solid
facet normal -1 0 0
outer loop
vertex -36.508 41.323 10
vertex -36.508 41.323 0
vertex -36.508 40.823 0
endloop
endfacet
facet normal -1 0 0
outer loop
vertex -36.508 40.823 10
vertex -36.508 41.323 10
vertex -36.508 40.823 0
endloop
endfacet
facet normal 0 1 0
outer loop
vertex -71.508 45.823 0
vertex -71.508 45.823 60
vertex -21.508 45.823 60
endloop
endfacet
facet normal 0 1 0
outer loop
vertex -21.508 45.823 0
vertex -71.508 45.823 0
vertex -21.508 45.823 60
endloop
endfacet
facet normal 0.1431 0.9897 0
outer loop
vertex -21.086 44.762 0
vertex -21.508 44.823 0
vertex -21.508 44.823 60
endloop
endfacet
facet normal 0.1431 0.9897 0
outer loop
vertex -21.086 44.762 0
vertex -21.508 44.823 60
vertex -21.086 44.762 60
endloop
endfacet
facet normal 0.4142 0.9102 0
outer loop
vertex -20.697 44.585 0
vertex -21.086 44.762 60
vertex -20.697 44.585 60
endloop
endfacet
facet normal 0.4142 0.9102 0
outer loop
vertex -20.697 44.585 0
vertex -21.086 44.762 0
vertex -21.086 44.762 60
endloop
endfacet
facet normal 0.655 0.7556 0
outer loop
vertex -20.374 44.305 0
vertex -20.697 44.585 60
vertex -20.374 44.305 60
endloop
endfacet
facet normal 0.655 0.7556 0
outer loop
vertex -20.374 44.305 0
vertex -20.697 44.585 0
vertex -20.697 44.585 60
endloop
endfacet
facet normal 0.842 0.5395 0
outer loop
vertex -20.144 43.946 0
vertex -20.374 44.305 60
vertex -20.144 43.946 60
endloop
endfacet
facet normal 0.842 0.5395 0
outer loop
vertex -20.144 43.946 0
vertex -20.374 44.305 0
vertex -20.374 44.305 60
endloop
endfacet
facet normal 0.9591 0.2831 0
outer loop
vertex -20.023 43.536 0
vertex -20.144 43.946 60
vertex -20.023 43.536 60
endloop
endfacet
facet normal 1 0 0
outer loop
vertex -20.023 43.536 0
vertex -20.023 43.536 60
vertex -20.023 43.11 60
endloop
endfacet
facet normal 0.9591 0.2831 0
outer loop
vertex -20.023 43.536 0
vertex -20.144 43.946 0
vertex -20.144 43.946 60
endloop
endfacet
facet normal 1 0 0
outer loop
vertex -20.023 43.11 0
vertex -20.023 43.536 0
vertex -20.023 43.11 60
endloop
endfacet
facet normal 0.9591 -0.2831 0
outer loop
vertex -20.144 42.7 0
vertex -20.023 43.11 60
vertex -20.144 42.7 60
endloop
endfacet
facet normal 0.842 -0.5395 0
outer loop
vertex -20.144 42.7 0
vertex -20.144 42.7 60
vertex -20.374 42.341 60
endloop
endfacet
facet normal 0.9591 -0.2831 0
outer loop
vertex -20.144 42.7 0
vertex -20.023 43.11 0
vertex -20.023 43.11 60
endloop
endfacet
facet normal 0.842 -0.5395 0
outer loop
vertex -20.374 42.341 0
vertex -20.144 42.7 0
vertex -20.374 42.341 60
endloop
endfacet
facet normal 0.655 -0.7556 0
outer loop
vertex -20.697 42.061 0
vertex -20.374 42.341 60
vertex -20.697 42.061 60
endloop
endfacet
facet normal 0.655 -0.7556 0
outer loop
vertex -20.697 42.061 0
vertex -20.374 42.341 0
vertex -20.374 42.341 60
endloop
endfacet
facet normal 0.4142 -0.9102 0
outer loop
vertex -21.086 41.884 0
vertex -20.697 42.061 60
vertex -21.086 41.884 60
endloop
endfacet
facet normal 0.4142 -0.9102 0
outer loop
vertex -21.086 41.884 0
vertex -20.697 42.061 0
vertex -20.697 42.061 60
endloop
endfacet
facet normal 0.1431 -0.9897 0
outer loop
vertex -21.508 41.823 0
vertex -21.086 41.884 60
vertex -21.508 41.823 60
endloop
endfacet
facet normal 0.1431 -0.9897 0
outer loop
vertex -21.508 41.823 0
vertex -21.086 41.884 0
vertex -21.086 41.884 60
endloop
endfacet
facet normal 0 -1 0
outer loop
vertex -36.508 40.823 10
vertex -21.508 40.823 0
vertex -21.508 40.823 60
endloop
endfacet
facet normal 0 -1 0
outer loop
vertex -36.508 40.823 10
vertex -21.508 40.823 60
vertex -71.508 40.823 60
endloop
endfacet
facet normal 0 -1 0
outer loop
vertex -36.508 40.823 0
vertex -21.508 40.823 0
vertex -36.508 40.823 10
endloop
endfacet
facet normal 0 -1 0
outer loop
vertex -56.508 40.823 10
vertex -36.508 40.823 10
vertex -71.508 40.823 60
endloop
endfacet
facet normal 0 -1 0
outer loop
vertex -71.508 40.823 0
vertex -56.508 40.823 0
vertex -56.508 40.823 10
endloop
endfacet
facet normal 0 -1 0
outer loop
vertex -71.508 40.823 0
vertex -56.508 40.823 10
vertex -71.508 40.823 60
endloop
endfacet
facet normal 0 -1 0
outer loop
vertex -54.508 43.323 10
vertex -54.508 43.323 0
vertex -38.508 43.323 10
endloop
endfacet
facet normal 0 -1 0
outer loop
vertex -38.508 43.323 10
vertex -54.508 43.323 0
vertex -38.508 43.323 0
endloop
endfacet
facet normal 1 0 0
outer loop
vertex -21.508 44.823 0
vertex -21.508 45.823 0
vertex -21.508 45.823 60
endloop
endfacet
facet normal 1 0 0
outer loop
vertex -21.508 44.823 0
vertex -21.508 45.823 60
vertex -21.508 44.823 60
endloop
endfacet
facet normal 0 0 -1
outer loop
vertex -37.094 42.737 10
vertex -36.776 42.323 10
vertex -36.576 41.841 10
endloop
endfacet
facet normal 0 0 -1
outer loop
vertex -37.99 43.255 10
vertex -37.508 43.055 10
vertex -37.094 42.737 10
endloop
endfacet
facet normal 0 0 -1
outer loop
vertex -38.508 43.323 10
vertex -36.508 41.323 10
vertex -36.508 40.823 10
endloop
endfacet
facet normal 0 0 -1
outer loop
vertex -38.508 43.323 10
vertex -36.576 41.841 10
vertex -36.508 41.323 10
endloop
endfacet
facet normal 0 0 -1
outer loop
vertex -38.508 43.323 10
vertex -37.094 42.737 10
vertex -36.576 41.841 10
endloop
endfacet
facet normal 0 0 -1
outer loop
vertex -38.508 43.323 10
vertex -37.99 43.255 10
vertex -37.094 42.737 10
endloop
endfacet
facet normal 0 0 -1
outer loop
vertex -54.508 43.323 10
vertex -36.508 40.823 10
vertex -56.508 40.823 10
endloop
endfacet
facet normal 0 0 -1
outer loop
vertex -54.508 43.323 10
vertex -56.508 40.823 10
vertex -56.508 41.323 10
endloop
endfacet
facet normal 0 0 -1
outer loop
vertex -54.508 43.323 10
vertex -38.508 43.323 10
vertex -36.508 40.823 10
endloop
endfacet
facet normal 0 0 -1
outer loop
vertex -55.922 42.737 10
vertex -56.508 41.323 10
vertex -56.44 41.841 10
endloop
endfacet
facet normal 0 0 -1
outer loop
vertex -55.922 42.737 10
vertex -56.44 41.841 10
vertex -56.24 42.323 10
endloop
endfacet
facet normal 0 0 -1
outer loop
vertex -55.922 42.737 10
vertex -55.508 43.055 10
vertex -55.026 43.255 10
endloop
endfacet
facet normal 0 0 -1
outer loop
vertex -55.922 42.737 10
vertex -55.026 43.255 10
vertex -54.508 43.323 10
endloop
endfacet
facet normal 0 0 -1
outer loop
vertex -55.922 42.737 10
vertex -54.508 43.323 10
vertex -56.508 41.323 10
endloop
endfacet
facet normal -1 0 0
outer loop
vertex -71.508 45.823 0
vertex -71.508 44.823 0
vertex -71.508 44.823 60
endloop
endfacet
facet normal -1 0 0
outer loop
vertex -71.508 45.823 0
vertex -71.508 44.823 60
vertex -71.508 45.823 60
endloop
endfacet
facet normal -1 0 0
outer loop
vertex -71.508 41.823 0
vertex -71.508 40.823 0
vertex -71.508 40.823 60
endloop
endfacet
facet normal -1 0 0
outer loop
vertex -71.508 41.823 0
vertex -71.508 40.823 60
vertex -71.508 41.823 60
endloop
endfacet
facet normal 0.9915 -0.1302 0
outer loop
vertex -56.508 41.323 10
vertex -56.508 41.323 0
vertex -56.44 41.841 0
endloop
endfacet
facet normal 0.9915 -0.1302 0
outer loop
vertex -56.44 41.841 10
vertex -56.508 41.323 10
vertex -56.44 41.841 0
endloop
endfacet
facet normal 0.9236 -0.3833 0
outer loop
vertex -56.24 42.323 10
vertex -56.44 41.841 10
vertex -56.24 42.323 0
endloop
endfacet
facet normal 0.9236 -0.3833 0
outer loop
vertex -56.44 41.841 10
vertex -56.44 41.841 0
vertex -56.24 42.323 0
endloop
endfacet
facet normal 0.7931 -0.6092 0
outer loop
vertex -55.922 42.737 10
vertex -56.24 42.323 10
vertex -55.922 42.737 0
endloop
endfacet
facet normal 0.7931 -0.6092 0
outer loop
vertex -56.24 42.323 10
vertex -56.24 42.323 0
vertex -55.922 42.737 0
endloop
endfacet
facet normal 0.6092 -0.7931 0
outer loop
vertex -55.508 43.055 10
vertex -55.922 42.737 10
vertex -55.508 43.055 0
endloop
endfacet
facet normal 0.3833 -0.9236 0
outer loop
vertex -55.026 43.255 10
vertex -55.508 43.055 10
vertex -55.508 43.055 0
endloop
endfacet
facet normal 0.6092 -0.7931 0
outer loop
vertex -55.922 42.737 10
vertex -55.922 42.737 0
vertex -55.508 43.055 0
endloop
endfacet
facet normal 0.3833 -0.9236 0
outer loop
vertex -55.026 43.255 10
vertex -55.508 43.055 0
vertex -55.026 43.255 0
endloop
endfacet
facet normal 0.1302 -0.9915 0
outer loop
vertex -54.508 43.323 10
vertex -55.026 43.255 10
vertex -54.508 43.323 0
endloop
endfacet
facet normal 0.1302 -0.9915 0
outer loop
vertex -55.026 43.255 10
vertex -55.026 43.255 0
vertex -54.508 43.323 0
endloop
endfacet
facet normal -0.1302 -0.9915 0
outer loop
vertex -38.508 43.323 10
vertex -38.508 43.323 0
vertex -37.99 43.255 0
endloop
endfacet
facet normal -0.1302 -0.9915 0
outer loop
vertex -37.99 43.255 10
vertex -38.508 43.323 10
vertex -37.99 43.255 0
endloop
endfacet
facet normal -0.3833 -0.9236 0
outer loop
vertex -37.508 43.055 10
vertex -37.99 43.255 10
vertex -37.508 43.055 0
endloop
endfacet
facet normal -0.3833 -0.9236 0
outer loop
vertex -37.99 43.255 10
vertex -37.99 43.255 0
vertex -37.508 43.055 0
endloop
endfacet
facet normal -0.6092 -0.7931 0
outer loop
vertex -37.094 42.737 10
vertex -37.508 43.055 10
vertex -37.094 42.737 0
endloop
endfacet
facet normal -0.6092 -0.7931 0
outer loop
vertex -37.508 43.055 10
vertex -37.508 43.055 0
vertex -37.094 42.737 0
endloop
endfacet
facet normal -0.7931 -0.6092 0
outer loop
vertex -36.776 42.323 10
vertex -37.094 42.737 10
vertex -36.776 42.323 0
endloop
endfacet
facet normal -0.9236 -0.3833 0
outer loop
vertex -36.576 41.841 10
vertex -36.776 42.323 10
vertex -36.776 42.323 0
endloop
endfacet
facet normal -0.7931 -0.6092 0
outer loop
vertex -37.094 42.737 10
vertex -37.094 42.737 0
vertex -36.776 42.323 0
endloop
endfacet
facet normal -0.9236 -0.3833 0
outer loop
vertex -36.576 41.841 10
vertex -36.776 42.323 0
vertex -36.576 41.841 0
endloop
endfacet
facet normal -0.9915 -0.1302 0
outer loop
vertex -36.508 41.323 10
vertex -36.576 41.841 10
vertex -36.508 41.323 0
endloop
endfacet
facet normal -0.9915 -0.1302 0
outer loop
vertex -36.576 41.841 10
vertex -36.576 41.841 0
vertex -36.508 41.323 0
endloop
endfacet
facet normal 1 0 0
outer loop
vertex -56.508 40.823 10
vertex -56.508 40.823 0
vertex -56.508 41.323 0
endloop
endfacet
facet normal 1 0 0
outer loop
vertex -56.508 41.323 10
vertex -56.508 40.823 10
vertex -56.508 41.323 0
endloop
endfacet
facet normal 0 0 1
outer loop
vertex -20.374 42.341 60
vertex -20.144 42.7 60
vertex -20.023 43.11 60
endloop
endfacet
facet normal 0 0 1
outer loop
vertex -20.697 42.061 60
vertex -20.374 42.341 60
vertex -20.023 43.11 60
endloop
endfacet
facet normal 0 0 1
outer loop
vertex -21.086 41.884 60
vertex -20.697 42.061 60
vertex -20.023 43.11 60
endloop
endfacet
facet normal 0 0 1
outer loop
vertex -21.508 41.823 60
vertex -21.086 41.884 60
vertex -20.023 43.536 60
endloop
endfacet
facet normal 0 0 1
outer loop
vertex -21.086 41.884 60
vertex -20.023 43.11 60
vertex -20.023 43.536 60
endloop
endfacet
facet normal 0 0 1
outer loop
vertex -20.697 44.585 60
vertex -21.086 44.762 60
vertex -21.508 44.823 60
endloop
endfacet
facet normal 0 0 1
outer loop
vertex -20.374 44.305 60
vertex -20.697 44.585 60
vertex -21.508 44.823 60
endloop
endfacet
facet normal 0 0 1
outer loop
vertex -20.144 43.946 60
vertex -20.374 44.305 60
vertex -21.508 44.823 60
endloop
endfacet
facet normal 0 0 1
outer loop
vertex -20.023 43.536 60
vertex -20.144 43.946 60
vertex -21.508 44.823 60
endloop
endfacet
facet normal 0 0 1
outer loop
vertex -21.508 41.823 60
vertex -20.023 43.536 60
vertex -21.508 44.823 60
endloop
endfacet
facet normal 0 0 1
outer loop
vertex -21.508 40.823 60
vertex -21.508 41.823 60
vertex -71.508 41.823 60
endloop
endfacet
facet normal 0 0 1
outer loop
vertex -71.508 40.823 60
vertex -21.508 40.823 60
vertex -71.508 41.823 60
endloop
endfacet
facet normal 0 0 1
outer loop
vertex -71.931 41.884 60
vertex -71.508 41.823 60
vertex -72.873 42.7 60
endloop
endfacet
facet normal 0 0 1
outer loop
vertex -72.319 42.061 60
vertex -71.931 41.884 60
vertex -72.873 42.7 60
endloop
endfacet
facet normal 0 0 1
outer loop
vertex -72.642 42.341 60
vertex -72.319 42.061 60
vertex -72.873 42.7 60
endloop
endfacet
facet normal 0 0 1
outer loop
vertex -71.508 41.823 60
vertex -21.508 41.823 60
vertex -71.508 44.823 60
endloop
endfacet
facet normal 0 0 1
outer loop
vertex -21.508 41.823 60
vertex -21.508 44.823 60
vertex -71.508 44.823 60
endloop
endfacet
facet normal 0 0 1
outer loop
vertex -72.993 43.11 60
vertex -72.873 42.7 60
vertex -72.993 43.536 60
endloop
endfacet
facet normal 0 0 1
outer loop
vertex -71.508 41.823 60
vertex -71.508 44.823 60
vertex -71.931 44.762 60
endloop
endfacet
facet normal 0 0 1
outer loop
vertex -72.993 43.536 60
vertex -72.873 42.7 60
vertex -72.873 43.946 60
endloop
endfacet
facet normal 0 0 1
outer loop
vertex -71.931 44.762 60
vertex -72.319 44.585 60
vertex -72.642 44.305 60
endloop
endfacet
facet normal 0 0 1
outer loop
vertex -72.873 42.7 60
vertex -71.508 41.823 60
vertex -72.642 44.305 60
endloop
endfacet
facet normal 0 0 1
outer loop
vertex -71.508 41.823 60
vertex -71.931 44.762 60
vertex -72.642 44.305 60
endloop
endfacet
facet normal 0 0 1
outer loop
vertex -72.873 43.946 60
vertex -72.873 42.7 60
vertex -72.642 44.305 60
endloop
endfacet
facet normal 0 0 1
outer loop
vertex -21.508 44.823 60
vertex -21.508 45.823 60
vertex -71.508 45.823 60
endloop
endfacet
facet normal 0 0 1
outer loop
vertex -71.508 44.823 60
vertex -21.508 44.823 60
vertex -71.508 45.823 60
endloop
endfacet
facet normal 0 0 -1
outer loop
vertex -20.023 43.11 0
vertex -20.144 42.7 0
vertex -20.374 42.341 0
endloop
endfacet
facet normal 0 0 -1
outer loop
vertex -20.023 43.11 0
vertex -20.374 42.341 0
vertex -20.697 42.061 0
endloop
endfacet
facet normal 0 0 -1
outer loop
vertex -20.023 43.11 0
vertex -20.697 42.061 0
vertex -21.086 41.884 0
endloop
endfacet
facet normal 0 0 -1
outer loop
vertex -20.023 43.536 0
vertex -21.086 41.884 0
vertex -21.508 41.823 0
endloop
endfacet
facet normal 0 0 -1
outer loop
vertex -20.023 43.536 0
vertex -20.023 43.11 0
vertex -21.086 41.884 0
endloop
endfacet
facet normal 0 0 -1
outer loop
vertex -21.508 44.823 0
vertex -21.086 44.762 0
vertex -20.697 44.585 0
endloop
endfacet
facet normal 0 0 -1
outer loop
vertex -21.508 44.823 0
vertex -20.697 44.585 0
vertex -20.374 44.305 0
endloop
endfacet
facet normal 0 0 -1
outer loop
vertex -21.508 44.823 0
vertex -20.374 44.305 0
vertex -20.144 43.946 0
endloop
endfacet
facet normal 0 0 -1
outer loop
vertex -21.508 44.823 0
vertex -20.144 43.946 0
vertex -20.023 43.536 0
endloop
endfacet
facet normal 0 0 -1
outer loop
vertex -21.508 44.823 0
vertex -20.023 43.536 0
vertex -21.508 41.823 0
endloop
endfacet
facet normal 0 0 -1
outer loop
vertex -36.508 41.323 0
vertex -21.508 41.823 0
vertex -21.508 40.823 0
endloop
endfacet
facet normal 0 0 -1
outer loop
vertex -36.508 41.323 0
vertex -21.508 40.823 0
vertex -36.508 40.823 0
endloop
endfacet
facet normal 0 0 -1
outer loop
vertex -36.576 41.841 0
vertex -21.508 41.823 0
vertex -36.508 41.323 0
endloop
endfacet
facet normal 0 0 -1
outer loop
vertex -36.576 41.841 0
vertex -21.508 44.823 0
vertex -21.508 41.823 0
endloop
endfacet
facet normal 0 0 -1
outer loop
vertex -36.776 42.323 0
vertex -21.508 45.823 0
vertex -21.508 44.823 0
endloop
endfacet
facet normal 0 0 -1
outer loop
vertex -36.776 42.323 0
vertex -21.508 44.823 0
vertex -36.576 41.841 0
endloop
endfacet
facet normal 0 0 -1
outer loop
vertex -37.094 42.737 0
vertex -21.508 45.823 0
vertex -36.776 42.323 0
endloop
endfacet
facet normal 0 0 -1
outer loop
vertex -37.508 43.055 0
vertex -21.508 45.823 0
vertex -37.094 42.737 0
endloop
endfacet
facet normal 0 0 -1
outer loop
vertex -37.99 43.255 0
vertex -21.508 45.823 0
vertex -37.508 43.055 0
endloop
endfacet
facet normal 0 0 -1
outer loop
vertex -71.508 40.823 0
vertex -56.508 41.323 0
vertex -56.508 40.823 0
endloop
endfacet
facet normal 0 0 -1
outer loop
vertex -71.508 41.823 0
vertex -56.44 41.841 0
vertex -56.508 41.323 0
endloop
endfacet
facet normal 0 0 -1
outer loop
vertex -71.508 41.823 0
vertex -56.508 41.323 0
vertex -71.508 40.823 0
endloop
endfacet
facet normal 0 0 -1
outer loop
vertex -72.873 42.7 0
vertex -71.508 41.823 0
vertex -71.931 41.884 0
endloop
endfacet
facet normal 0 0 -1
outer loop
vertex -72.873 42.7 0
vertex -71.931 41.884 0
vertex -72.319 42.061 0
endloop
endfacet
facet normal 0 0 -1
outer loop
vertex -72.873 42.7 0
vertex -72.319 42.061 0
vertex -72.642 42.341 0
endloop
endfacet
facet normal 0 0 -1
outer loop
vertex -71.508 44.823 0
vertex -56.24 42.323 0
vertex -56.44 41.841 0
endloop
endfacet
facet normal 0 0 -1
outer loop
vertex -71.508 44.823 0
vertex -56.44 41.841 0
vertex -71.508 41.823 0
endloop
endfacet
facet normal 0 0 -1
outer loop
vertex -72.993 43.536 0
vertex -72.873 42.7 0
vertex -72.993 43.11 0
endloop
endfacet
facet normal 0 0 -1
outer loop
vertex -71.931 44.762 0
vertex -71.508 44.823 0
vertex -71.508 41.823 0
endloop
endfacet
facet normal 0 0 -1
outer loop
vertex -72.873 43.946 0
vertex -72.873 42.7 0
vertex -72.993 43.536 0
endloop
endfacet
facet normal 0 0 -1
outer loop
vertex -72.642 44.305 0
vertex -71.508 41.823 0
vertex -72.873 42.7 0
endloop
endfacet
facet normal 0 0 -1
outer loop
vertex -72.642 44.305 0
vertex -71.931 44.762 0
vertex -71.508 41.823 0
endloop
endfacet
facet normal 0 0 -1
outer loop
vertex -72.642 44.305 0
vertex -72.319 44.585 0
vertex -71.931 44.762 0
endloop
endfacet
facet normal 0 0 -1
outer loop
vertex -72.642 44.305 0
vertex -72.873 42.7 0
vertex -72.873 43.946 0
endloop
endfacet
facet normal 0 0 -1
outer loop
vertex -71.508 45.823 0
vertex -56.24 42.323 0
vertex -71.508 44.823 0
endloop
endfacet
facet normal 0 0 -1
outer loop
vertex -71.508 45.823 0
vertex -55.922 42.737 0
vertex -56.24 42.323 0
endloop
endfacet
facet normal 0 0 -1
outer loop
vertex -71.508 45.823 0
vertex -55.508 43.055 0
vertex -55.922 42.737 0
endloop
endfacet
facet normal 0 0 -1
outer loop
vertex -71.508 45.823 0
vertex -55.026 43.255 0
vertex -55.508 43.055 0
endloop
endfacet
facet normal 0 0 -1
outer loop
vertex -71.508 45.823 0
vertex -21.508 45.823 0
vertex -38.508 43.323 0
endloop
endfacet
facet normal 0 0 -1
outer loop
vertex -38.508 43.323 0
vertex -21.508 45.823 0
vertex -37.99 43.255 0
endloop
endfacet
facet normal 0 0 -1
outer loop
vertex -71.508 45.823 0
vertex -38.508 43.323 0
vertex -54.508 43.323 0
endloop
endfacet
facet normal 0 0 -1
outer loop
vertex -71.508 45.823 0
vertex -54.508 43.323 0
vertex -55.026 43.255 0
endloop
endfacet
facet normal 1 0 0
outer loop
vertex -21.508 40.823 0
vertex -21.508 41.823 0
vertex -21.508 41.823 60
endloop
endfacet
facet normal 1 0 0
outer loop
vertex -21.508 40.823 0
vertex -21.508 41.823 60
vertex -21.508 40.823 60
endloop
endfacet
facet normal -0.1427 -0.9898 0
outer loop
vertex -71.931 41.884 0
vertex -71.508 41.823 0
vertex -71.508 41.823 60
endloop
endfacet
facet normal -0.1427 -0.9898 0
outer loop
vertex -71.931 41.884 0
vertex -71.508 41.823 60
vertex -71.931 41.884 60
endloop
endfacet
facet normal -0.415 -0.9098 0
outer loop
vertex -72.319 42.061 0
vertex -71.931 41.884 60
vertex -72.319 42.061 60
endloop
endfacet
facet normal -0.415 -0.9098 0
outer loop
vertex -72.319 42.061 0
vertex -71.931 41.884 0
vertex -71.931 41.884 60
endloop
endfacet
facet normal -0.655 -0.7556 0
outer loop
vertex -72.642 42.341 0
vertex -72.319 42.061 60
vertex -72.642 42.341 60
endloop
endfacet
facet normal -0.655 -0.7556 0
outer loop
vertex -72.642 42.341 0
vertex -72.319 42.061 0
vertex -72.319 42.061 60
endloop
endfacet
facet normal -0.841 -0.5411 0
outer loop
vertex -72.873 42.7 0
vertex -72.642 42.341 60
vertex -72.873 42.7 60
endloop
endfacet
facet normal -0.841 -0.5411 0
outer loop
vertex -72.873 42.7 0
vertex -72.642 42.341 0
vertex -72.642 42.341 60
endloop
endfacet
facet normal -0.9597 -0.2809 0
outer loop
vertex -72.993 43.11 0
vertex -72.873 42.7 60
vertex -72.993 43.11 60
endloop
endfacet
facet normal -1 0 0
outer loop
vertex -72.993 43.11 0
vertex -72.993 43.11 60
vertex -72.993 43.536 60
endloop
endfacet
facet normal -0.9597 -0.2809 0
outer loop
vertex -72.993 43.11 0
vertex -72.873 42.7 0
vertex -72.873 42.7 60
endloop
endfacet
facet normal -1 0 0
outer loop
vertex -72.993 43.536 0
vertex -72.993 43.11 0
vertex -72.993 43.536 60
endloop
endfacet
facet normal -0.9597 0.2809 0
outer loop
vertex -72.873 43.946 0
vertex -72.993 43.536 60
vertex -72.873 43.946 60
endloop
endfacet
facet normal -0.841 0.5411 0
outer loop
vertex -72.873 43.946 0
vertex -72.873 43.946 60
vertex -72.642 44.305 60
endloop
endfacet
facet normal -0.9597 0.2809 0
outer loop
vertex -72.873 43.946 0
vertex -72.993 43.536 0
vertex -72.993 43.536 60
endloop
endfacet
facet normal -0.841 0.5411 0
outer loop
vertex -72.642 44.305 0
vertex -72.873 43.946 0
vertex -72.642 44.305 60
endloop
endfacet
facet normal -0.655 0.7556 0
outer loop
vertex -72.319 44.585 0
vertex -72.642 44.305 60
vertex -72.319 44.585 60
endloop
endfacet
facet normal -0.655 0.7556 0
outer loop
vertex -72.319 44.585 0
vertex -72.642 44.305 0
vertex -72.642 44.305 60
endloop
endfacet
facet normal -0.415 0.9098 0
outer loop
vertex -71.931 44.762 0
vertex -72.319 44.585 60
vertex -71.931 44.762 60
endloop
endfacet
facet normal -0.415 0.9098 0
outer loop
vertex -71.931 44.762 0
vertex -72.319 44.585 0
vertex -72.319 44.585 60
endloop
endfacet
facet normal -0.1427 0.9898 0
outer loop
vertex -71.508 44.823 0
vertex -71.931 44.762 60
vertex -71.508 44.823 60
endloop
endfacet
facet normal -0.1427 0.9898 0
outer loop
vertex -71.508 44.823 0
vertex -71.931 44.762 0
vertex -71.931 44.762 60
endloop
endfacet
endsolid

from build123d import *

# Parameters (mm, degrees)
SALIENTE_EXTRUIR1_DEPTH = 60
CORTAR_EXTRUIR1_DEPTH   = 10


with BuildPart() as part:
    # Croquis1 → Saliente-Extruir1 (new body)
    with BuildSketch(Plane.XY):
        with BuildLine():
            Line((-71.508108108, 44.822972973), (-71.508108108, 45.822972973))
            Line((-71.508108108, 45.822972973), (-21.508108108, 45.822972973))
            Line((-21.508108108, 45.822972973), (-21.508108108, 44.822972973))
            ThreePointArc((-21.508108108, 44.822972973), (-20.008108108, 43.322972973), (-21.508108108, 41.822972973))
            Line((-21.508108108, 41.822972973), (-21.508108108, 40.822972973))
            Line((-21.508108108, 40.822972973), (-71.508108108, 40.822972973))
            Line((-71.508108108, 40.822972973), (-71.508108108, 41.822972973))
            ThreePointArc((-71.508108108, 41.822972973), (-73.008108108, 43.322972973), (-71.508108108, 44.822972973))
        make_face()
    extrude(amount=SALIENTE_EXTRUIR1_DEPTH)

    # Croquis3 → Cortar-Extruir1 (cut)
    with BuildSketch(Plane(origin=(0, 0, 0), x_dir=(-1, 0, 0), z_dir=(0, 0, -1))):
        with BuildLine():
            Line((36.508108108, 41.322972973), (36.508108108, 40.822972973))
            Line((36.508108108, 40.822972973), (56.508108108, 40.822972973))
            Line((56.508108108, 40.822972973), (56.508108108, 41.322972973))
            ThreePointArc((56.508108108, 41.322972973), (55.92232167, 42.737186535), (54.508108108, 43.322972973))
            Line((54.508108108, 43.322972973), (38.508108108, 43.322972973))
            ThreePointArc((38.508108108, 43.322972973), (37.093894546, 42.737186535), (36.508108108, 41.322972973))
        make_face()
    extrude(amount=-CORTAR_EXTRUIR1_DEPTH, mode=Mode.SUBTRACT)


solid = part.part
